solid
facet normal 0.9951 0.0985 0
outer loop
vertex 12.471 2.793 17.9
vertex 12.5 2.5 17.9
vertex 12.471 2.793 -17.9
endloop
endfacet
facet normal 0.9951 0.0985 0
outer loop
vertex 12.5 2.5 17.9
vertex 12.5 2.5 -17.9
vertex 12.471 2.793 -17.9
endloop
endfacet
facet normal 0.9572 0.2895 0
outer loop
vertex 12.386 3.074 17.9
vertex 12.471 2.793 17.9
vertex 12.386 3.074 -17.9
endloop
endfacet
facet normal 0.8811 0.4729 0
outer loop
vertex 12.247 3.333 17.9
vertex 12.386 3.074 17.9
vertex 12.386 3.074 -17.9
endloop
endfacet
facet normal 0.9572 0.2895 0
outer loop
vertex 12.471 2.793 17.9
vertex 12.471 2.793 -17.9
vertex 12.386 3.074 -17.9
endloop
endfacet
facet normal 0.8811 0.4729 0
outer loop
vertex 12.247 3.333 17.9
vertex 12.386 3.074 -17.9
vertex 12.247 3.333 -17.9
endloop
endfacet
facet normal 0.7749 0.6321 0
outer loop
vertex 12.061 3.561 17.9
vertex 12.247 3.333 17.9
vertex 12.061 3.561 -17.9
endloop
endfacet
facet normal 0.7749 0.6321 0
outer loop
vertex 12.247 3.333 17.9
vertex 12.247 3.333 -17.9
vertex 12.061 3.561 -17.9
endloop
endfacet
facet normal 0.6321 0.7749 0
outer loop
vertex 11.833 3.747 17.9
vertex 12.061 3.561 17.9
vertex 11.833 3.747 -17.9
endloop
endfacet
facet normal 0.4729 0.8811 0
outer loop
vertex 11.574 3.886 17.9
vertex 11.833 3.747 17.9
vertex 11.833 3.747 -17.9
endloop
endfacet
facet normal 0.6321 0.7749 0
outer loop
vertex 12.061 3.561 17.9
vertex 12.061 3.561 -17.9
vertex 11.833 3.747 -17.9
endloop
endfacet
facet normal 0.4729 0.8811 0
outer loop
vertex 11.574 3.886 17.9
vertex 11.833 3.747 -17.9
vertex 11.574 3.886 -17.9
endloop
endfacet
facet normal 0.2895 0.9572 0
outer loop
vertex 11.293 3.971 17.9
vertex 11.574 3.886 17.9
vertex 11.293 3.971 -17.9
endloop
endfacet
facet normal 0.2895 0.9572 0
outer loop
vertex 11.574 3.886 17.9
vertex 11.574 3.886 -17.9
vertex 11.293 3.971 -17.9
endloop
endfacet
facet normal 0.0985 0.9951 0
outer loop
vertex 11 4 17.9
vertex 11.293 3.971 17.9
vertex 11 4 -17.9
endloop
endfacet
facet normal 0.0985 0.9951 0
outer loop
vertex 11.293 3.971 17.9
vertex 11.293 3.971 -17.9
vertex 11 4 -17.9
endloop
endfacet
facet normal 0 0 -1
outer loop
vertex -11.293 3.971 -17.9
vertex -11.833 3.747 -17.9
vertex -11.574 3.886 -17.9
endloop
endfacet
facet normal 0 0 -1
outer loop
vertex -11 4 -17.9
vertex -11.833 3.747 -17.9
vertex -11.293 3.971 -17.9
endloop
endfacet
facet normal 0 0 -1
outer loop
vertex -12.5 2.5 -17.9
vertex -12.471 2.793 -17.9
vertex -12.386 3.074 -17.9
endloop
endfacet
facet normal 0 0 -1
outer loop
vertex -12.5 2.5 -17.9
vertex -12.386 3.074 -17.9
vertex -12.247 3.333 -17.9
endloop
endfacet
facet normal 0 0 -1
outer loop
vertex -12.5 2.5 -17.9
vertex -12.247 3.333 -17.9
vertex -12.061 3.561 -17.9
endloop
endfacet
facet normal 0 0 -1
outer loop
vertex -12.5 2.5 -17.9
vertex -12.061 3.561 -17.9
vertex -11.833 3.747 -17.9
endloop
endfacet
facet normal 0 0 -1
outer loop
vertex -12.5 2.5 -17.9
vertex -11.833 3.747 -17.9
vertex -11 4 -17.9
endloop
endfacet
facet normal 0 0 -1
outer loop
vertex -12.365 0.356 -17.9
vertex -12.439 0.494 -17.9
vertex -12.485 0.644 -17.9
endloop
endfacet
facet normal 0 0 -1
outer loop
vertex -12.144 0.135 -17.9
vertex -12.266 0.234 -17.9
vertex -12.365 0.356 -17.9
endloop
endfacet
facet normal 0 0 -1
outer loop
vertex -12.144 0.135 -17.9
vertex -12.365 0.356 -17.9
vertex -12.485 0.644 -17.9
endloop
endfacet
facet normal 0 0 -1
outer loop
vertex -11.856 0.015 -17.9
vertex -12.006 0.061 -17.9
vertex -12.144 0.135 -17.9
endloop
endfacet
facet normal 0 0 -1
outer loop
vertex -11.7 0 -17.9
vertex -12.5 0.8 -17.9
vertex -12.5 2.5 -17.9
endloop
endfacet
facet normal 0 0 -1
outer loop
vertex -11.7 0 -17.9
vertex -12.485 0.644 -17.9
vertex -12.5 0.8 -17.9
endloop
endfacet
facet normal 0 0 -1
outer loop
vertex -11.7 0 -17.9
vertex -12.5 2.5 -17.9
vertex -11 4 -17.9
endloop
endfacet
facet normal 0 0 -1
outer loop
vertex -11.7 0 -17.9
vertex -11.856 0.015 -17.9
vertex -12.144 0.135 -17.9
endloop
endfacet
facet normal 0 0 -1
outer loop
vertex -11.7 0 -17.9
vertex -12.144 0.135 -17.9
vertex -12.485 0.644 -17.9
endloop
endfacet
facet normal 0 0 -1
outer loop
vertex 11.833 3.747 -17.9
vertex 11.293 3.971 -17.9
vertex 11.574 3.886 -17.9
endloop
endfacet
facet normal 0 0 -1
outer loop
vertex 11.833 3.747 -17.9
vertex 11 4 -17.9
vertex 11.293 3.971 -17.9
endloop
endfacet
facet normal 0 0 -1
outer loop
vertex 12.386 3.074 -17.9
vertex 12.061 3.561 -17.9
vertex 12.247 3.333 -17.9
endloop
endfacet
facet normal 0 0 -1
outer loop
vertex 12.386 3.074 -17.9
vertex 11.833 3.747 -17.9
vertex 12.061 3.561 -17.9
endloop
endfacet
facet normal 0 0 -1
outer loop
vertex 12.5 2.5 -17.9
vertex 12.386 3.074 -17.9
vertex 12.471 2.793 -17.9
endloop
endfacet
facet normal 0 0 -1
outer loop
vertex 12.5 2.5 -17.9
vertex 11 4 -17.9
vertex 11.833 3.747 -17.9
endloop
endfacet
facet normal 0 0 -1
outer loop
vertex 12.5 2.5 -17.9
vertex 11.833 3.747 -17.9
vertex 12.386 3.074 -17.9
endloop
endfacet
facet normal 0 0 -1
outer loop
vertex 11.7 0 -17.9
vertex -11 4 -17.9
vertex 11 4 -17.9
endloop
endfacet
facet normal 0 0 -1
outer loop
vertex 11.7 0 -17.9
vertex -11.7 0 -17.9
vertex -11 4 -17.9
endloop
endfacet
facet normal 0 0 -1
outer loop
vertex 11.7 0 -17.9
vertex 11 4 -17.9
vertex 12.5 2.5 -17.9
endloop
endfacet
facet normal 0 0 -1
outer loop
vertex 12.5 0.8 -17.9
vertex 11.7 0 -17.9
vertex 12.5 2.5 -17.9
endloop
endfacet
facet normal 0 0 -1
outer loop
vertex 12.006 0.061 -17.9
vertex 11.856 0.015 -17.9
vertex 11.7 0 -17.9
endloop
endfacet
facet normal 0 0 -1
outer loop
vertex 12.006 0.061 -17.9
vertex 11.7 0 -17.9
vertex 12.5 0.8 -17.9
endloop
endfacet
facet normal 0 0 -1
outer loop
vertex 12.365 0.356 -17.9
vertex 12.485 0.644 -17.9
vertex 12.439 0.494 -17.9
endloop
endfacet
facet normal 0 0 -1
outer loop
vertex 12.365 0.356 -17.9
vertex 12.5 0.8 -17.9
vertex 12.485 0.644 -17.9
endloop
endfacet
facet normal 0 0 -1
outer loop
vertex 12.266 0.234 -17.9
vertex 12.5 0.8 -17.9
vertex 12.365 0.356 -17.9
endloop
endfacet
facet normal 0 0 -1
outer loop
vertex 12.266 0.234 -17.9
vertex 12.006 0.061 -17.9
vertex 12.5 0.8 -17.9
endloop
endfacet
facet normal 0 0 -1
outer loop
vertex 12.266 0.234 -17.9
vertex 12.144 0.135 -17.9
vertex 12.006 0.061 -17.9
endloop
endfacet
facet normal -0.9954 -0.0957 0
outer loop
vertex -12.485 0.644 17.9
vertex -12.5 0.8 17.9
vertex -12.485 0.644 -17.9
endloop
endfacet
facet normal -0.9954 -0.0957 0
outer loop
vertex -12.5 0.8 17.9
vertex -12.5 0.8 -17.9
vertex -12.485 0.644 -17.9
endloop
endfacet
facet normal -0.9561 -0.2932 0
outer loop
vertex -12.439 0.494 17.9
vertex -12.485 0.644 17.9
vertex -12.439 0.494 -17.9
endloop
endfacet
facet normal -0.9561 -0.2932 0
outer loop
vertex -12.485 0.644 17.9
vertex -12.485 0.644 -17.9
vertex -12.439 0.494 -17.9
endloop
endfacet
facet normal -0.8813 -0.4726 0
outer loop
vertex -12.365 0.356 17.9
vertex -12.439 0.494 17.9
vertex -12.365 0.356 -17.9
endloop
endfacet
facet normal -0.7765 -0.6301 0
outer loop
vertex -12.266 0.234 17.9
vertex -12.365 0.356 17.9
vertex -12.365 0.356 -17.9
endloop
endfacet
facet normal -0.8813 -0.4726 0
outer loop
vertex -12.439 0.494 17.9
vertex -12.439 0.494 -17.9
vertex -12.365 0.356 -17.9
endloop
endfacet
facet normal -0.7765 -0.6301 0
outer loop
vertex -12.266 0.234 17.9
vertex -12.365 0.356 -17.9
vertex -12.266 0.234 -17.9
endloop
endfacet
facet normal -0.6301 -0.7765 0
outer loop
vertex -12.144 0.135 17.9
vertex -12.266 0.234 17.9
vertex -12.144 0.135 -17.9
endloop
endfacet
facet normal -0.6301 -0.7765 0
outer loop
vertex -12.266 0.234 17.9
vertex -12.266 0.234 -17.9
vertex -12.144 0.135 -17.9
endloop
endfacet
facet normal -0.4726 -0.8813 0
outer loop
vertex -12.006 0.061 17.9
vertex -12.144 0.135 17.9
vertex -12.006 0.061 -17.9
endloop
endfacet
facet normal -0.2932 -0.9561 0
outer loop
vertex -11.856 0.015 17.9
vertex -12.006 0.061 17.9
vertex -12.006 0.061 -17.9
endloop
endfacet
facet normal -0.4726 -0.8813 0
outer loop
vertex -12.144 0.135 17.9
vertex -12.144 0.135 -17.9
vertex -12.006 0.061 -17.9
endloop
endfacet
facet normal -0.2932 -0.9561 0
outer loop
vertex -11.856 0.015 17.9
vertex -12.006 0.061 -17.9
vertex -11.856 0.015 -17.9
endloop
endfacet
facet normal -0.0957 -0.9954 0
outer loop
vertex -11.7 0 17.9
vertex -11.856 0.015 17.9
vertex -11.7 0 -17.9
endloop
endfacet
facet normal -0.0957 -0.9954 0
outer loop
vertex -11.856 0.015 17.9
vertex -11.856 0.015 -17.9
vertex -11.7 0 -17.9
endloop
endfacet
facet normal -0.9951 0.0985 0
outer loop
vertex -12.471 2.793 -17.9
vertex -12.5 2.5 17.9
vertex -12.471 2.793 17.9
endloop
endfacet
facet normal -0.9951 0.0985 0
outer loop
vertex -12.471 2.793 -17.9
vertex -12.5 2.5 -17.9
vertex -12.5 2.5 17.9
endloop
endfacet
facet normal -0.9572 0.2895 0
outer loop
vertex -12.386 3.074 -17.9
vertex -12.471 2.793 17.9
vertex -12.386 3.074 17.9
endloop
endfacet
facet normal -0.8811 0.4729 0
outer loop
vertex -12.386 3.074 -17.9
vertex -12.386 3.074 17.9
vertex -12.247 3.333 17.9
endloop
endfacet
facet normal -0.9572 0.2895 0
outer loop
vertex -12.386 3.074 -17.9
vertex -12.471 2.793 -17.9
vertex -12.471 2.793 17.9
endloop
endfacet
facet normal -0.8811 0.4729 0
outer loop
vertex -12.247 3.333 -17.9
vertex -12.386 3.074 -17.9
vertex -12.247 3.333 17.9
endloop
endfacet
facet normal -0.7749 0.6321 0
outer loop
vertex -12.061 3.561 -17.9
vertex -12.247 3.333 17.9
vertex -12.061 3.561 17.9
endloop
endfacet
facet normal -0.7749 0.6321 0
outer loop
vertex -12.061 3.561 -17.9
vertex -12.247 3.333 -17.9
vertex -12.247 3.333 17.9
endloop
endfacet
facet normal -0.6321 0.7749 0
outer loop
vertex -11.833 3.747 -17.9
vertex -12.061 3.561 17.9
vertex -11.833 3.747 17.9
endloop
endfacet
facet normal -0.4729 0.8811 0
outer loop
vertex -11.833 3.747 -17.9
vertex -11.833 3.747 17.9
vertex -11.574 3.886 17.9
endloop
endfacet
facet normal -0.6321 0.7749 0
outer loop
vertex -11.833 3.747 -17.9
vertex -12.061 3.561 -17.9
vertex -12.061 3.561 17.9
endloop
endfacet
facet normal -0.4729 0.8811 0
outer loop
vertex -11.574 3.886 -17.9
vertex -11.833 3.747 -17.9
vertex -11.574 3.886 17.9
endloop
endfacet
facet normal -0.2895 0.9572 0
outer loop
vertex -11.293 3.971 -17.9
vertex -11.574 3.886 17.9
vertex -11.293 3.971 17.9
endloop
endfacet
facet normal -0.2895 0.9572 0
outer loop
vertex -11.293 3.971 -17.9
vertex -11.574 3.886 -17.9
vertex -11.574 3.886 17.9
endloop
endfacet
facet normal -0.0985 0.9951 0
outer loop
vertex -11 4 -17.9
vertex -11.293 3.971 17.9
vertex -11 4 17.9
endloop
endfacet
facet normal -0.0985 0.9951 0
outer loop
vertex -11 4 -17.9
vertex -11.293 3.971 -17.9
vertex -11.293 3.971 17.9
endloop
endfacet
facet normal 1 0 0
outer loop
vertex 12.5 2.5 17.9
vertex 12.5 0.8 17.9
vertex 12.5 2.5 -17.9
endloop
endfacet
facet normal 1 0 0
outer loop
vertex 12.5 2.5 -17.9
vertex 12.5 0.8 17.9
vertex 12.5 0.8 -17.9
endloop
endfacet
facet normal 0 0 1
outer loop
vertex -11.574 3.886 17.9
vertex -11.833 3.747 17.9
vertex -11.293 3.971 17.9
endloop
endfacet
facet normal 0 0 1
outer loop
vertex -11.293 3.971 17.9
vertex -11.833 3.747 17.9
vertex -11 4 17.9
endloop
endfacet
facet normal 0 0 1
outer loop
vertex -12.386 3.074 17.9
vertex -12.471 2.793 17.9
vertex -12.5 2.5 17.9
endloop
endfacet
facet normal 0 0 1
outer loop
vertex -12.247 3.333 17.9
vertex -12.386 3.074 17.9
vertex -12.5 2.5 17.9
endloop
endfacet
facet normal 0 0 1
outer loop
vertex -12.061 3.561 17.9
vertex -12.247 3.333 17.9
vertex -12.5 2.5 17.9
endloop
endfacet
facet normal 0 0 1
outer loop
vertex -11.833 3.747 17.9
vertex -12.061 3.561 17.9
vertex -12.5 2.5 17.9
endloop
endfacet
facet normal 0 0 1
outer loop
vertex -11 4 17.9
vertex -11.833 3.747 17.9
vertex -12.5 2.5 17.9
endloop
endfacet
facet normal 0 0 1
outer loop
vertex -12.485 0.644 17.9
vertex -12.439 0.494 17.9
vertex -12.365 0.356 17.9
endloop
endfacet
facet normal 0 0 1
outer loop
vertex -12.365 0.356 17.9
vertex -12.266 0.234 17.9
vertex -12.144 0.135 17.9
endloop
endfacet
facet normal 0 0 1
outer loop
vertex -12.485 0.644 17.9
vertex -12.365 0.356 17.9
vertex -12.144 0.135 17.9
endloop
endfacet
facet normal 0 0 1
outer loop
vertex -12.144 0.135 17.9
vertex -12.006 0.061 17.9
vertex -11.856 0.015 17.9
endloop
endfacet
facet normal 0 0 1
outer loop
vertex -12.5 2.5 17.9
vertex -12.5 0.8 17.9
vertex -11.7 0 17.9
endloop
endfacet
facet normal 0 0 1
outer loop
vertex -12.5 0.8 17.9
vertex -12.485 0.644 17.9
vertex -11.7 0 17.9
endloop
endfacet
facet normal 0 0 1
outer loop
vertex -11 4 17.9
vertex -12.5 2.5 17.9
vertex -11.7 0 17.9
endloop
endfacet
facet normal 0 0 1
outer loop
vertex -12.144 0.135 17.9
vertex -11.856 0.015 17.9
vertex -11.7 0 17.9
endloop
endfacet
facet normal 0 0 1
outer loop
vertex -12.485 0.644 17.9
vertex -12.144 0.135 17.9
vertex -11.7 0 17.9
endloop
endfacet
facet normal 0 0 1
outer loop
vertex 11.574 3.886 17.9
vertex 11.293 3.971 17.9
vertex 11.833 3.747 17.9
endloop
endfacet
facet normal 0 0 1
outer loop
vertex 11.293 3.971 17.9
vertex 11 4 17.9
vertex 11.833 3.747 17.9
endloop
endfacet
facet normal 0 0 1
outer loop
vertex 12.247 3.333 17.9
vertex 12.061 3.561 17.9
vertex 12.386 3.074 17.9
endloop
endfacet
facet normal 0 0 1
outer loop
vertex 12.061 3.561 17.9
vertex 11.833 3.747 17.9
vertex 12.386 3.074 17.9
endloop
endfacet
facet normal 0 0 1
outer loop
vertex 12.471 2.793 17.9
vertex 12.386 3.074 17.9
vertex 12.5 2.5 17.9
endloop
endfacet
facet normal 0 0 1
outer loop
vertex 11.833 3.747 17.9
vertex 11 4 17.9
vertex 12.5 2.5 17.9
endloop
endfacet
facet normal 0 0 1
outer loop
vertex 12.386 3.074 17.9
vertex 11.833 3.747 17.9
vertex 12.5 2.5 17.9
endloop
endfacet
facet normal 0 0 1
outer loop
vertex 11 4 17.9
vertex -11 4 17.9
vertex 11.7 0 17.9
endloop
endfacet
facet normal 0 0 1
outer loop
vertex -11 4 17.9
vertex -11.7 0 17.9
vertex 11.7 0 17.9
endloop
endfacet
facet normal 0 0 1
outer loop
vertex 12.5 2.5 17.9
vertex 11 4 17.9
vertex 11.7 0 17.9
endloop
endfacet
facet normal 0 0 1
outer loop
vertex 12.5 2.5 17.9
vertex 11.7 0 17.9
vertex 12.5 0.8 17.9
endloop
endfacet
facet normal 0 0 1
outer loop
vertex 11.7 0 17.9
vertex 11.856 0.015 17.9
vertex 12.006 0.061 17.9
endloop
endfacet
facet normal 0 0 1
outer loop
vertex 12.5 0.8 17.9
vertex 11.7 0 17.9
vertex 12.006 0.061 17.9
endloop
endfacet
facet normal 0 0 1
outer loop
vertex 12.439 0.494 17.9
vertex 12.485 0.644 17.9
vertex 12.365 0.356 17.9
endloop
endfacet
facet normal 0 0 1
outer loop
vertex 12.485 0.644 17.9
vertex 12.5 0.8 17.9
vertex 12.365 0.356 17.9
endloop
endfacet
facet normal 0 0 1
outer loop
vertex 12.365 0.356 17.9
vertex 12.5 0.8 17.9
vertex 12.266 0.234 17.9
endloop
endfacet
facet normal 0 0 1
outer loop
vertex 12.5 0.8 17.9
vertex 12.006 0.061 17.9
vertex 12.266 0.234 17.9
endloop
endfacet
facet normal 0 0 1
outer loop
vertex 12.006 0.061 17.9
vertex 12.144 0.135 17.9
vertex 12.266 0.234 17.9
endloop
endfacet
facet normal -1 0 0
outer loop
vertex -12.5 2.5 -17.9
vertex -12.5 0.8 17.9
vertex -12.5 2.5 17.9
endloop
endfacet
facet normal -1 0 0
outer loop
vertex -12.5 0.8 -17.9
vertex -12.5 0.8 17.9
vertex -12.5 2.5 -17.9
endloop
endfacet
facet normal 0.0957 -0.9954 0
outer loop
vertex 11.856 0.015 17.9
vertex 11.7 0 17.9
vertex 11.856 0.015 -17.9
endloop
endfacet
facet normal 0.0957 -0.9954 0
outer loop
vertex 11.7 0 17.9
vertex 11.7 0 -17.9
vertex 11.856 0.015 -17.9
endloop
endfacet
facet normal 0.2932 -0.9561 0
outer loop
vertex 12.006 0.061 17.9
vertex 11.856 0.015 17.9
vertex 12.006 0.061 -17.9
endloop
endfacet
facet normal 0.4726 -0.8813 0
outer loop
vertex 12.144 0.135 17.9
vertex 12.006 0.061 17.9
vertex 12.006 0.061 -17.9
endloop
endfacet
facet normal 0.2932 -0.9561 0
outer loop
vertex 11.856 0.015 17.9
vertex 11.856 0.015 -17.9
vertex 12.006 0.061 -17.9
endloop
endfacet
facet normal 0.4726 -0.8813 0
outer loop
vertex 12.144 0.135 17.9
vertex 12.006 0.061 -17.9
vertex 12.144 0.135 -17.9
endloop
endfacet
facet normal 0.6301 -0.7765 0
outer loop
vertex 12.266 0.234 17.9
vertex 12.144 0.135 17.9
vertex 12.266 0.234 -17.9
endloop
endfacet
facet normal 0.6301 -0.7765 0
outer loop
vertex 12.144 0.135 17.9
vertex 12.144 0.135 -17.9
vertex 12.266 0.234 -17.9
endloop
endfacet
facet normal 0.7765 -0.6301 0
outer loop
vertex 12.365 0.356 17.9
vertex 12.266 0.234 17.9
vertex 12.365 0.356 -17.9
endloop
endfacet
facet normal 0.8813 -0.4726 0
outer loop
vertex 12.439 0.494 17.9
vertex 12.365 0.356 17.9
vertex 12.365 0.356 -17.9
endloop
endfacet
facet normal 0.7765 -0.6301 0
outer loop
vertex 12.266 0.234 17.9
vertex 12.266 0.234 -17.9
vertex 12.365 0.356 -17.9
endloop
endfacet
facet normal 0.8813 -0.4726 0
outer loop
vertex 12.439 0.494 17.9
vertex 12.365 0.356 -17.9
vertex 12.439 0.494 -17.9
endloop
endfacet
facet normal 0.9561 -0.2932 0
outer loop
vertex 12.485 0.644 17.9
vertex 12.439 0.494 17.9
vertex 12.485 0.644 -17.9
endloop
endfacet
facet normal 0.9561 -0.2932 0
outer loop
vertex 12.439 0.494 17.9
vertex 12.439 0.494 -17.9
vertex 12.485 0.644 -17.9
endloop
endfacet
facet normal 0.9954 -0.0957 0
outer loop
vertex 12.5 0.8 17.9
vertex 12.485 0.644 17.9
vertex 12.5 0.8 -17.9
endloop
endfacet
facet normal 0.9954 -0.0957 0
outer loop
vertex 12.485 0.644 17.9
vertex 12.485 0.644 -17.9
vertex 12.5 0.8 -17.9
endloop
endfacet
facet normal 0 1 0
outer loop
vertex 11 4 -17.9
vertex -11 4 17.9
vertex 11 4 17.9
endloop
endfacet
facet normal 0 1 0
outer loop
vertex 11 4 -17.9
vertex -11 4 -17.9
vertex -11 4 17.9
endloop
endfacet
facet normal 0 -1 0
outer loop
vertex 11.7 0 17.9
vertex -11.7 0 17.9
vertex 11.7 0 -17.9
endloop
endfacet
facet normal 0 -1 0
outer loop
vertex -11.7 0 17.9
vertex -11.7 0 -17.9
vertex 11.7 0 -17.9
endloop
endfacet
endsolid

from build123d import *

# Parameters (mm, degrees)
SKETCH1_W           = 25
SKETCH1_H           = 35.8
BOSS_EXTRUDE1_DEPTH = 4
FILLET1_R           = 1.5
FILLET2_R           = 0.8


with BuildPart() as part:
    # Sketch1 → Boss-Extrude1 (new body)
    with BuildSketch(Plane(origin=(0, 0, 0), x_dir=(1, 0, 0), z_dir=(0, 1, 0))):
        Rectangle(SKETCH1_W, SKETCH1_H)
    extrude(amount=BOSS_EXTRUDE1_DEPTH)

    # Fillet1
    fillet1_edges = [part.edges().sort_by_distance(p)[0] for p in [
        (-12.5, 4, 0),
        (12.5, 4, 0),
    ]]
    fillet(fillet1_edges, radius=FILLET1_R)

    # Fillet2
    fillet2_edges = [part.edges().sort_by_distance(p)[0] for p in [
        (-12.5, 0, 0),
        (12.5, 0, 0),
    ]]
    fillet(fillet2_edges, radius=FILLET2_R)


solid = part.part
